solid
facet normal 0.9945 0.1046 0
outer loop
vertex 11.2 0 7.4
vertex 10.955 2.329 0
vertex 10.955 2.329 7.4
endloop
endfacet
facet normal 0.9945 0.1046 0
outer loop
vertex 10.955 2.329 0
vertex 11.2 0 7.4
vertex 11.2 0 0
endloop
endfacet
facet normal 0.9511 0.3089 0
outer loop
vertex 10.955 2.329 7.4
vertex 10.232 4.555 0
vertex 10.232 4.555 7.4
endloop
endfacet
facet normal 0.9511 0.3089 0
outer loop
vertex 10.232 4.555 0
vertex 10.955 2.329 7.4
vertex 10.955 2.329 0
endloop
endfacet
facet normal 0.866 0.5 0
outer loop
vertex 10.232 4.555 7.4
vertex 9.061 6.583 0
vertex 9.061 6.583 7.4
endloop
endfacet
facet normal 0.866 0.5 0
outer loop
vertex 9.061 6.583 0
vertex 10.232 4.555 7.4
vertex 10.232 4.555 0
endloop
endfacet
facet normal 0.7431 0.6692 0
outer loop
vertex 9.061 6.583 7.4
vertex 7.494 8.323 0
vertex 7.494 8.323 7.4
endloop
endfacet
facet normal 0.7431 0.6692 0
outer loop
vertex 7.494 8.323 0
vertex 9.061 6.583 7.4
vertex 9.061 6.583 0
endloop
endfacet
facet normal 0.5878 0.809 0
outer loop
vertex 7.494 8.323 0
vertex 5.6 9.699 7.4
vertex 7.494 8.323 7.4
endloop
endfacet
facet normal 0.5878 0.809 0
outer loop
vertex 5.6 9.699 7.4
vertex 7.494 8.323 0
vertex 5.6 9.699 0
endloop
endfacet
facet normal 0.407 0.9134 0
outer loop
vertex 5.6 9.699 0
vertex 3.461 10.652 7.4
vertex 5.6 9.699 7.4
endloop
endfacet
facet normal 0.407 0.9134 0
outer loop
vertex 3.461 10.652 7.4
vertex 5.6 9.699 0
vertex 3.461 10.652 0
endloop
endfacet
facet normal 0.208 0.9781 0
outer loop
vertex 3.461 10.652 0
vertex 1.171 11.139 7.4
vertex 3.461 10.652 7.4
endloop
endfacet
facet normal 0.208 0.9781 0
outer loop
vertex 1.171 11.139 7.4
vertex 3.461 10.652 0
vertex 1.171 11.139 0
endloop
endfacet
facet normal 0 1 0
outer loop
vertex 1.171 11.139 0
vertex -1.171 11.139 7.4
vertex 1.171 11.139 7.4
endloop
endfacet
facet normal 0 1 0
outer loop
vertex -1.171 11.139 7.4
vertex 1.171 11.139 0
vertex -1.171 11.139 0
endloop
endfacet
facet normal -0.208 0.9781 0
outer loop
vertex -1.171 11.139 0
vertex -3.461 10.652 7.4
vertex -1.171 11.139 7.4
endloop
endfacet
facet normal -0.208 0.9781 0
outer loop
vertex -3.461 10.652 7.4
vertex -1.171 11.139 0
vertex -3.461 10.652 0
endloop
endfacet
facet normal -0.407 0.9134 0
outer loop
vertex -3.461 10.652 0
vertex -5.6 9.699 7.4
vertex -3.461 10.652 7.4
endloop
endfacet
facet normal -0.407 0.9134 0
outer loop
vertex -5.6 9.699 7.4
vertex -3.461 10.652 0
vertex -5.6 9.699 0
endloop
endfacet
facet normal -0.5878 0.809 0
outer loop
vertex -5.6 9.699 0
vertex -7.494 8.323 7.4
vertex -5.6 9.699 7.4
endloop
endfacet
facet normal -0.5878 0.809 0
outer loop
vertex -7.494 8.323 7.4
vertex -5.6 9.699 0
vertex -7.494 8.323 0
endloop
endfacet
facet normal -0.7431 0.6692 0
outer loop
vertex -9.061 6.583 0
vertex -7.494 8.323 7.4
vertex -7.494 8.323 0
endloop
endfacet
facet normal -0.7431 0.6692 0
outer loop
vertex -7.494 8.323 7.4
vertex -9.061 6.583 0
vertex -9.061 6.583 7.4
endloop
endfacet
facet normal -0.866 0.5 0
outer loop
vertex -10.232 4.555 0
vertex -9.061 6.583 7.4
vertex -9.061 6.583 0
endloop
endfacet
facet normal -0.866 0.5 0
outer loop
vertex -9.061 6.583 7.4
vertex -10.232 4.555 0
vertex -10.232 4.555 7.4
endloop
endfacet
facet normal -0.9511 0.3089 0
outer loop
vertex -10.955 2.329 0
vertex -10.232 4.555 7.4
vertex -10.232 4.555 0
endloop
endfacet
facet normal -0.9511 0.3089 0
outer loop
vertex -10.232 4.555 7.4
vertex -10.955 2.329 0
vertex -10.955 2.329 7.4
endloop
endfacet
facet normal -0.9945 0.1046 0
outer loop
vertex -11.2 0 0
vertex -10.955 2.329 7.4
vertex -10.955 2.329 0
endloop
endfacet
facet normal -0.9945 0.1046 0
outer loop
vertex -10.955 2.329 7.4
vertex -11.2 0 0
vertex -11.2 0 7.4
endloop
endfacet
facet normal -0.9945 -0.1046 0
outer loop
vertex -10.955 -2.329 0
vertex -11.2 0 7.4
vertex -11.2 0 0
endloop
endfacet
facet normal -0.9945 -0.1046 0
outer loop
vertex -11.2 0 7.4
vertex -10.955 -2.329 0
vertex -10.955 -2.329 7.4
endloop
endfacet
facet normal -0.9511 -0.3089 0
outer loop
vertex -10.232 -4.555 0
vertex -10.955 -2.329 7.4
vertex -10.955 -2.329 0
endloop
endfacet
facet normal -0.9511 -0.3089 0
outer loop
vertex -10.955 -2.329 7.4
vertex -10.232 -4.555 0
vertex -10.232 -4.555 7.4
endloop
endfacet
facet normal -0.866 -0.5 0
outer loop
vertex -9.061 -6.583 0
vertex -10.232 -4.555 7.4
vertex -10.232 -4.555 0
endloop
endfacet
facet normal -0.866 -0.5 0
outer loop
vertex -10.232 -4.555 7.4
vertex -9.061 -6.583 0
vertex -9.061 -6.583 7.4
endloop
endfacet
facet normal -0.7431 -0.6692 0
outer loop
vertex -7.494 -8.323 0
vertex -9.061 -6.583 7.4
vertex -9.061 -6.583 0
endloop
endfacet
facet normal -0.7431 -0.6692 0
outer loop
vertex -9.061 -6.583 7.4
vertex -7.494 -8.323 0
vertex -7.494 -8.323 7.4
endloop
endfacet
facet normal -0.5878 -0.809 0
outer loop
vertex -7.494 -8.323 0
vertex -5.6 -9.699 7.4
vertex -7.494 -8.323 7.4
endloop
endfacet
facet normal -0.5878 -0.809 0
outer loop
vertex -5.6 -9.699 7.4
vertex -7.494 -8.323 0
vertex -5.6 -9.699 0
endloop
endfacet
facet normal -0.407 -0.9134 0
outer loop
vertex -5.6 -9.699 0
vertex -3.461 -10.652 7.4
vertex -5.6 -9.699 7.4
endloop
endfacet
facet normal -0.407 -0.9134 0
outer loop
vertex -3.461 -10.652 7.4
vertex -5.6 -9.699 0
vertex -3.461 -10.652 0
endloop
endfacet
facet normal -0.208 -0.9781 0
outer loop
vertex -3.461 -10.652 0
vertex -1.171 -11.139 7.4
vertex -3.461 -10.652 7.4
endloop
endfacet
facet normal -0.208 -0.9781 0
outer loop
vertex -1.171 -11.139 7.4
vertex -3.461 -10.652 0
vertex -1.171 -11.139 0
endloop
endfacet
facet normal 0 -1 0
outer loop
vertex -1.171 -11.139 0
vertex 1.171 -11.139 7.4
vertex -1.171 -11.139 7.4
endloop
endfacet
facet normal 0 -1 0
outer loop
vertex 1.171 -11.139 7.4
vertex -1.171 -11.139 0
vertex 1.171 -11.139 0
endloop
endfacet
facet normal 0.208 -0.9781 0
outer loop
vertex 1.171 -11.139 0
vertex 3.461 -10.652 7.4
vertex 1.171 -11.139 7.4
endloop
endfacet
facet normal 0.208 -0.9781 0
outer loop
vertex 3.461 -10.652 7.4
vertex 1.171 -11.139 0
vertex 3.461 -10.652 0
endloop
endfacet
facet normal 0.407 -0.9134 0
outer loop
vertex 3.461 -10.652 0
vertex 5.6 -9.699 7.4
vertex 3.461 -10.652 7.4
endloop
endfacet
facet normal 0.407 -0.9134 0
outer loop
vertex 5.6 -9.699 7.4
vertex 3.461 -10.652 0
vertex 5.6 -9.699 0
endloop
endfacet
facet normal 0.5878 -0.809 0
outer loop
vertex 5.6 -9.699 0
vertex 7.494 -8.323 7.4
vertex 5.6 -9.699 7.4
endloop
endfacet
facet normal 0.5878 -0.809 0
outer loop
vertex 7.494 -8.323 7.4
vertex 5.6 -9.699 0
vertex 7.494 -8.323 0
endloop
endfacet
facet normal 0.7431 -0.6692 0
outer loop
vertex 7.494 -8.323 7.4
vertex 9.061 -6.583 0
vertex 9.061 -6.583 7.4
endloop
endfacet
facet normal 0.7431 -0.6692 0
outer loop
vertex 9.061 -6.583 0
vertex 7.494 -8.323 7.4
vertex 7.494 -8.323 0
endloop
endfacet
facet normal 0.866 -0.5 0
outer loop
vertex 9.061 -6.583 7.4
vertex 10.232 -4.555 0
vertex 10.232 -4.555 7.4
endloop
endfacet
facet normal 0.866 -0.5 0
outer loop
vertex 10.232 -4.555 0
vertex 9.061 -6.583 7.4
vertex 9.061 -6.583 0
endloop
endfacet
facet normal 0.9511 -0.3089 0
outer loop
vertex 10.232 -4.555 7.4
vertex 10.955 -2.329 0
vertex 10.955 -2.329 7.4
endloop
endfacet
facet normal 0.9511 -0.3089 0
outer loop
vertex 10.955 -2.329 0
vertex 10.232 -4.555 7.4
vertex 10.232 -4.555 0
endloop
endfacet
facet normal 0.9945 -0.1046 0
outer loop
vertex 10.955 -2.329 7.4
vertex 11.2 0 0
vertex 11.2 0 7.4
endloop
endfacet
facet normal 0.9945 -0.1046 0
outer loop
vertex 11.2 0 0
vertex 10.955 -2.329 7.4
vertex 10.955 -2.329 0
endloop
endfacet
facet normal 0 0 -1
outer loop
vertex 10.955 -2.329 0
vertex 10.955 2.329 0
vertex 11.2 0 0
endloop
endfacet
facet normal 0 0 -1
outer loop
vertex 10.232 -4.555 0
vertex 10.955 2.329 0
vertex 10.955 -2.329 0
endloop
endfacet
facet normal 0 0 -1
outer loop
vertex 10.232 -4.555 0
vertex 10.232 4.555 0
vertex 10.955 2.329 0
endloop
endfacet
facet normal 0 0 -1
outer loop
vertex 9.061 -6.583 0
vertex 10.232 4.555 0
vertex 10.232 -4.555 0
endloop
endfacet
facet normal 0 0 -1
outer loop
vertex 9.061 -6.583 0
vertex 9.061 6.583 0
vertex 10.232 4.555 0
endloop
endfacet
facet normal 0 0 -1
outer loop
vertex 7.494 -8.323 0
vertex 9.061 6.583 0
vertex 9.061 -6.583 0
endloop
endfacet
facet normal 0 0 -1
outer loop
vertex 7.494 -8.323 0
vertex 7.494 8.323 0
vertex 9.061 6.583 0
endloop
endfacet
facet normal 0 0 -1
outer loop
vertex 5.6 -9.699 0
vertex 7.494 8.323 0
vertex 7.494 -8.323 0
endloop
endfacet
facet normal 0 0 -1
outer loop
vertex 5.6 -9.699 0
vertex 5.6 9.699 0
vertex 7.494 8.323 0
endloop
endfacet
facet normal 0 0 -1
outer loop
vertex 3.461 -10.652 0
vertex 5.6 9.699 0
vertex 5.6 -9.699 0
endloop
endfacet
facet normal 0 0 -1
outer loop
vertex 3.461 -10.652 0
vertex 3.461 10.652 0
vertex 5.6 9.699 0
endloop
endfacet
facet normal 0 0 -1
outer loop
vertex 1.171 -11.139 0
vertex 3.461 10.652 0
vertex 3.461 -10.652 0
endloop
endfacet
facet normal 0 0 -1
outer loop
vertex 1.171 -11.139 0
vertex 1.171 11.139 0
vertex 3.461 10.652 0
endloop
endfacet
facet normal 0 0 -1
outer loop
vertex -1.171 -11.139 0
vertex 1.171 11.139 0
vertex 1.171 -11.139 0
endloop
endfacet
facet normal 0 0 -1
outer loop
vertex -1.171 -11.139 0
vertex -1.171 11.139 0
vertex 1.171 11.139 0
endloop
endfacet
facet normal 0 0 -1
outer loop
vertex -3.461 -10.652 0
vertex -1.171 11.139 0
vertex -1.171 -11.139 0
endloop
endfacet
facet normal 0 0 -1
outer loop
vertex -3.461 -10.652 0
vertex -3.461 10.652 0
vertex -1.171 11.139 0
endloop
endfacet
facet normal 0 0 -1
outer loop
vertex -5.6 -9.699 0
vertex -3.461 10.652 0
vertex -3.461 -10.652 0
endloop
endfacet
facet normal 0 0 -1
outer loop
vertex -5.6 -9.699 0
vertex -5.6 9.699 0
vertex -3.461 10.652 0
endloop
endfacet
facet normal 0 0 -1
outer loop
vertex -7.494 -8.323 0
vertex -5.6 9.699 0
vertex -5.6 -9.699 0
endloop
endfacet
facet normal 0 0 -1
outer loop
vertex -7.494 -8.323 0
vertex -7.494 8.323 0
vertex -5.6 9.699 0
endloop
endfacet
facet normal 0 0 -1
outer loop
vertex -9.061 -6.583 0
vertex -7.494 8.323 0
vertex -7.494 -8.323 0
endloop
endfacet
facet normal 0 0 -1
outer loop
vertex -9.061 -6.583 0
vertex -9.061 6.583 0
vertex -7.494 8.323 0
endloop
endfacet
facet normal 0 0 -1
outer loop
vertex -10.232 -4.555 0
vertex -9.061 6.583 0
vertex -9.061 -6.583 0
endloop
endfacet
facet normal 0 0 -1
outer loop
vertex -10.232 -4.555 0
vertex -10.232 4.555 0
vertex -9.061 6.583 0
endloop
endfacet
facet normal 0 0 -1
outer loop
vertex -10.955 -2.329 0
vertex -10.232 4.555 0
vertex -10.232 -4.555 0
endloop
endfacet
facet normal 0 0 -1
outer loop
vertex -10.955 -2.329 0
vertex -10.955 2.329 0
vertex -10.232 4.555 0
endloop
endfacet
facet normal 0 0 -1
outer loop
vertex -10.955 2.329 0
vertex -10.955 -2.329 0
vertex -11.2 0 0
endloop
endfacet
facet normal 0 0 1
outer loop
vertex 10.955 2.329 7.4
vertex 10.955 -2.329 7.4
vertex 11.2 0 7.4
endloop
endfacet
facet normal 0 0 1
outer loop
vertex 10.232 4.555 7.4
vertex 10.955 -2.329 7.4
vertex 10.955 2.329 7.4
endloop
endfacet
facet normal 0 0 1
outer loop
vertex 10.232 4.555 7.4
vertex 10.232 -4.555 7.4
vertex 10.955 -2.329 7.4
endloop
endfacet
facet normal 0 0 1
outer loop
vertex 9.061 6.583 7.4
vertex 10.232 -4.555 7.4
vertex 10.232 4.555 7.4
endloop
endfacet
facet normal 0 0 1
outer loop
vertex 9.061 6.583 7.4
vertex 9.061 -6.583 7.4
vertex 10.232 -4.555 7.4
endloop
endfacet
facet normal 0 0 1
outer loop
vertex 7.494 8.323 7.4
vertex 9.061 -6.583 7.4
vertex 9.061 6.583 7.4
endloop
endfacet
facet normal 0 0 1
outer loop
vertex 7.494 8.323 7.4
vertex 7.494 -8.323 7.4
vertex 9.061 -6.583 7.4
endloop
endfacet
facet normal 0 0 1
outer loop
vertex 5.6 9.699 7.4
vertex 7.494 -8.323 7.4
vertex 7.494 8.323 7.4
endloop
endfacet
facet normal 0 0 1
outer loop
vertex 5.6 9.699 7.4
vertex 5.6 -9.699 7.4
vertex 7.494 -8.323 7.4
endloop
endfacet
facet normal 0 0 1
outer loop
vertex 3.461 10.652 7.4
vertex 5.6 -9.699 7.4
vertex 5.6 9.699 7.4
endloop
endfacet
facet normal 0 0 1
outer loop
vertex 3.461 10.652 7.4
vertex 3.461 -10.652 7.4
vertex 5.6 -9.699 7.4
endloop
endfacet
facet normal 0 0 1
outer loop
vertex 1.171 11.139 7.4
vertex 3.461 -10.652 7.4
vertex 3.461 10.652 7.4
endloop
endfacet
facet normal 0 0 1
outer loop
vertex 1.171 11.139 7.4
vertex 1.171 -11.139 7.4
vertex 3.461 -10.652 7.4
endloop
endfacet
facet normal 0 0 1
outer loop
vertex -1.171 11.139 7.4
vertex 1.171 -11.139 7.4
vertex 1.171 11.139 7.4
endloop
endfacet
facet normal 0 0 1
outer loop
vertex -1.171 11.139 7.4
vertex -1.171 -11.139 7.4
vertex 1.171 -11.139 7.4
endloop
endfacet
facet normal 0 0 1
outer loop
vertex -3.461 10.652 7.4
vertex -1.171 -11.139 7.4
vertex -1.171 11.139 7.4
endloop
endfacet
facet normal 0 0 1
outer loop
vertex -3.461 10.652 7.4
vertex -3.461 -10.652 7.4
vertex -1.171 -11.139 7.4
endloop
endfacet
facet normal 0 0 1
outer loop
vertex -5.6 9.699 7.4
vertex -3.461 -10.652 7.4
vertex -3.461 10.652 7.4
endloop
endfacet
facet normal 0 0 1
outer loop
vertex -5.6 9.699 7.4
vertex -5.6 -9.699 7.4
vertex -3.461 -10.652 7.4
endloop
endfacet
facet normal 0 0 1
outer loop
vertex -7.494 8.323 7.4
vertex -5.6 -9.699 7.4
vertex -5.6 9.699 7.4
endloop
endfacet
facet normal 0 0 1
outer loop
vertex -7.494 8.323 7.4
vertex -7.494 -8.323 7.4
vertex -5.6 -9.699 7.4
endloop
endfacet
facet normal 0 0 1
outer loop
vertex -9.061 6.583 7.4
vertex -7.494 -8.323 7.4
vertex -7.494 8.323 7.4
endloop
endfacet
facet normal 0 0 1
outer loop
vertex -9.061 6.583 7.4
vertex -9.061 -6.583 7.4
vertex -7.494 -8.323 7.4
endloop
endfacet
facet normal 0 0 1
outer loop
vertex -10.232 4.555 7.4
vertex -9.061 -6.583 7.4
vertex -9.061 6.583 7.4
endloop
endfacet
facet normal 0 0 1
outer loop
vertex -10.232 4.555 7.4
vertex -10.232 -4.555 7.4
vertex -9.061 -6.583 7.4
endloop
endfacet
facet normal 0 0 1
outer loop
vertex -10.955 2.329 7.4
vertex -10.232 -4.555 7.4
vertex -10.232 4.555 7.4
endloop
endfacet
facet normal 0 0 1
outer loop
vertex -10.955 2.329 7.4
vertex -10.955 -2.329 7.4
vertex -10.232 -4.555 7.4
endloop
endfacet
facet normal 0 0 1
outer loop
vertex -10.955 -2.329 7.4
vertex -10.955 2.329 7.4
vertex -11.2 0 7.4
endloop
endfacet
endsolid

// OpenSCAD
function 608BallBearingDiam(3dPrinterTolerance=.4) = 22+3dPrinterTolerance;
function 608BallBearingHeight(3dPrinterTolerance=.4) = 7+3dPrinterTolerance;
function 608BallBearingInnerDiam(3dPrinterTolerance=.4)= 8-3dPrinterTolerance;

function 608BallBearingAvgDiam(3dPrinterTolerance=.4)= (608BallBearingDiam(3dPrinterTolerance)+608BallBearingInnerDiam(3dPrinterTolerance))/2;


module 608BallBearing(3dPrinterTolerance=.4)
{
	union()
	{
		cylinder(h=608BallBearingHeight(3dPrinterTolerance), r=608BallBearingDiam()/2);
		//cylinder(608BallBearingHeight(3dPrinterTolerance), 608BallBearingInnerDiam(3dPrinterTolerance)/2, 608BallBearingInnerDiam(3dPrinterTolerance)/2);
	}
}

608BallBearing();


//This is a long keepaway to make bearing-sized holes in a part:

module 608BearingKeepaway(3dPrinterTolerance=.4)
{
	cylinder(h=608BallBearingHeight(3dPrinterTolerance)*4,r=608BallBearingDiam(3dPrinterTolerance)/2);
}

//608BearingKeepaway(.4);
